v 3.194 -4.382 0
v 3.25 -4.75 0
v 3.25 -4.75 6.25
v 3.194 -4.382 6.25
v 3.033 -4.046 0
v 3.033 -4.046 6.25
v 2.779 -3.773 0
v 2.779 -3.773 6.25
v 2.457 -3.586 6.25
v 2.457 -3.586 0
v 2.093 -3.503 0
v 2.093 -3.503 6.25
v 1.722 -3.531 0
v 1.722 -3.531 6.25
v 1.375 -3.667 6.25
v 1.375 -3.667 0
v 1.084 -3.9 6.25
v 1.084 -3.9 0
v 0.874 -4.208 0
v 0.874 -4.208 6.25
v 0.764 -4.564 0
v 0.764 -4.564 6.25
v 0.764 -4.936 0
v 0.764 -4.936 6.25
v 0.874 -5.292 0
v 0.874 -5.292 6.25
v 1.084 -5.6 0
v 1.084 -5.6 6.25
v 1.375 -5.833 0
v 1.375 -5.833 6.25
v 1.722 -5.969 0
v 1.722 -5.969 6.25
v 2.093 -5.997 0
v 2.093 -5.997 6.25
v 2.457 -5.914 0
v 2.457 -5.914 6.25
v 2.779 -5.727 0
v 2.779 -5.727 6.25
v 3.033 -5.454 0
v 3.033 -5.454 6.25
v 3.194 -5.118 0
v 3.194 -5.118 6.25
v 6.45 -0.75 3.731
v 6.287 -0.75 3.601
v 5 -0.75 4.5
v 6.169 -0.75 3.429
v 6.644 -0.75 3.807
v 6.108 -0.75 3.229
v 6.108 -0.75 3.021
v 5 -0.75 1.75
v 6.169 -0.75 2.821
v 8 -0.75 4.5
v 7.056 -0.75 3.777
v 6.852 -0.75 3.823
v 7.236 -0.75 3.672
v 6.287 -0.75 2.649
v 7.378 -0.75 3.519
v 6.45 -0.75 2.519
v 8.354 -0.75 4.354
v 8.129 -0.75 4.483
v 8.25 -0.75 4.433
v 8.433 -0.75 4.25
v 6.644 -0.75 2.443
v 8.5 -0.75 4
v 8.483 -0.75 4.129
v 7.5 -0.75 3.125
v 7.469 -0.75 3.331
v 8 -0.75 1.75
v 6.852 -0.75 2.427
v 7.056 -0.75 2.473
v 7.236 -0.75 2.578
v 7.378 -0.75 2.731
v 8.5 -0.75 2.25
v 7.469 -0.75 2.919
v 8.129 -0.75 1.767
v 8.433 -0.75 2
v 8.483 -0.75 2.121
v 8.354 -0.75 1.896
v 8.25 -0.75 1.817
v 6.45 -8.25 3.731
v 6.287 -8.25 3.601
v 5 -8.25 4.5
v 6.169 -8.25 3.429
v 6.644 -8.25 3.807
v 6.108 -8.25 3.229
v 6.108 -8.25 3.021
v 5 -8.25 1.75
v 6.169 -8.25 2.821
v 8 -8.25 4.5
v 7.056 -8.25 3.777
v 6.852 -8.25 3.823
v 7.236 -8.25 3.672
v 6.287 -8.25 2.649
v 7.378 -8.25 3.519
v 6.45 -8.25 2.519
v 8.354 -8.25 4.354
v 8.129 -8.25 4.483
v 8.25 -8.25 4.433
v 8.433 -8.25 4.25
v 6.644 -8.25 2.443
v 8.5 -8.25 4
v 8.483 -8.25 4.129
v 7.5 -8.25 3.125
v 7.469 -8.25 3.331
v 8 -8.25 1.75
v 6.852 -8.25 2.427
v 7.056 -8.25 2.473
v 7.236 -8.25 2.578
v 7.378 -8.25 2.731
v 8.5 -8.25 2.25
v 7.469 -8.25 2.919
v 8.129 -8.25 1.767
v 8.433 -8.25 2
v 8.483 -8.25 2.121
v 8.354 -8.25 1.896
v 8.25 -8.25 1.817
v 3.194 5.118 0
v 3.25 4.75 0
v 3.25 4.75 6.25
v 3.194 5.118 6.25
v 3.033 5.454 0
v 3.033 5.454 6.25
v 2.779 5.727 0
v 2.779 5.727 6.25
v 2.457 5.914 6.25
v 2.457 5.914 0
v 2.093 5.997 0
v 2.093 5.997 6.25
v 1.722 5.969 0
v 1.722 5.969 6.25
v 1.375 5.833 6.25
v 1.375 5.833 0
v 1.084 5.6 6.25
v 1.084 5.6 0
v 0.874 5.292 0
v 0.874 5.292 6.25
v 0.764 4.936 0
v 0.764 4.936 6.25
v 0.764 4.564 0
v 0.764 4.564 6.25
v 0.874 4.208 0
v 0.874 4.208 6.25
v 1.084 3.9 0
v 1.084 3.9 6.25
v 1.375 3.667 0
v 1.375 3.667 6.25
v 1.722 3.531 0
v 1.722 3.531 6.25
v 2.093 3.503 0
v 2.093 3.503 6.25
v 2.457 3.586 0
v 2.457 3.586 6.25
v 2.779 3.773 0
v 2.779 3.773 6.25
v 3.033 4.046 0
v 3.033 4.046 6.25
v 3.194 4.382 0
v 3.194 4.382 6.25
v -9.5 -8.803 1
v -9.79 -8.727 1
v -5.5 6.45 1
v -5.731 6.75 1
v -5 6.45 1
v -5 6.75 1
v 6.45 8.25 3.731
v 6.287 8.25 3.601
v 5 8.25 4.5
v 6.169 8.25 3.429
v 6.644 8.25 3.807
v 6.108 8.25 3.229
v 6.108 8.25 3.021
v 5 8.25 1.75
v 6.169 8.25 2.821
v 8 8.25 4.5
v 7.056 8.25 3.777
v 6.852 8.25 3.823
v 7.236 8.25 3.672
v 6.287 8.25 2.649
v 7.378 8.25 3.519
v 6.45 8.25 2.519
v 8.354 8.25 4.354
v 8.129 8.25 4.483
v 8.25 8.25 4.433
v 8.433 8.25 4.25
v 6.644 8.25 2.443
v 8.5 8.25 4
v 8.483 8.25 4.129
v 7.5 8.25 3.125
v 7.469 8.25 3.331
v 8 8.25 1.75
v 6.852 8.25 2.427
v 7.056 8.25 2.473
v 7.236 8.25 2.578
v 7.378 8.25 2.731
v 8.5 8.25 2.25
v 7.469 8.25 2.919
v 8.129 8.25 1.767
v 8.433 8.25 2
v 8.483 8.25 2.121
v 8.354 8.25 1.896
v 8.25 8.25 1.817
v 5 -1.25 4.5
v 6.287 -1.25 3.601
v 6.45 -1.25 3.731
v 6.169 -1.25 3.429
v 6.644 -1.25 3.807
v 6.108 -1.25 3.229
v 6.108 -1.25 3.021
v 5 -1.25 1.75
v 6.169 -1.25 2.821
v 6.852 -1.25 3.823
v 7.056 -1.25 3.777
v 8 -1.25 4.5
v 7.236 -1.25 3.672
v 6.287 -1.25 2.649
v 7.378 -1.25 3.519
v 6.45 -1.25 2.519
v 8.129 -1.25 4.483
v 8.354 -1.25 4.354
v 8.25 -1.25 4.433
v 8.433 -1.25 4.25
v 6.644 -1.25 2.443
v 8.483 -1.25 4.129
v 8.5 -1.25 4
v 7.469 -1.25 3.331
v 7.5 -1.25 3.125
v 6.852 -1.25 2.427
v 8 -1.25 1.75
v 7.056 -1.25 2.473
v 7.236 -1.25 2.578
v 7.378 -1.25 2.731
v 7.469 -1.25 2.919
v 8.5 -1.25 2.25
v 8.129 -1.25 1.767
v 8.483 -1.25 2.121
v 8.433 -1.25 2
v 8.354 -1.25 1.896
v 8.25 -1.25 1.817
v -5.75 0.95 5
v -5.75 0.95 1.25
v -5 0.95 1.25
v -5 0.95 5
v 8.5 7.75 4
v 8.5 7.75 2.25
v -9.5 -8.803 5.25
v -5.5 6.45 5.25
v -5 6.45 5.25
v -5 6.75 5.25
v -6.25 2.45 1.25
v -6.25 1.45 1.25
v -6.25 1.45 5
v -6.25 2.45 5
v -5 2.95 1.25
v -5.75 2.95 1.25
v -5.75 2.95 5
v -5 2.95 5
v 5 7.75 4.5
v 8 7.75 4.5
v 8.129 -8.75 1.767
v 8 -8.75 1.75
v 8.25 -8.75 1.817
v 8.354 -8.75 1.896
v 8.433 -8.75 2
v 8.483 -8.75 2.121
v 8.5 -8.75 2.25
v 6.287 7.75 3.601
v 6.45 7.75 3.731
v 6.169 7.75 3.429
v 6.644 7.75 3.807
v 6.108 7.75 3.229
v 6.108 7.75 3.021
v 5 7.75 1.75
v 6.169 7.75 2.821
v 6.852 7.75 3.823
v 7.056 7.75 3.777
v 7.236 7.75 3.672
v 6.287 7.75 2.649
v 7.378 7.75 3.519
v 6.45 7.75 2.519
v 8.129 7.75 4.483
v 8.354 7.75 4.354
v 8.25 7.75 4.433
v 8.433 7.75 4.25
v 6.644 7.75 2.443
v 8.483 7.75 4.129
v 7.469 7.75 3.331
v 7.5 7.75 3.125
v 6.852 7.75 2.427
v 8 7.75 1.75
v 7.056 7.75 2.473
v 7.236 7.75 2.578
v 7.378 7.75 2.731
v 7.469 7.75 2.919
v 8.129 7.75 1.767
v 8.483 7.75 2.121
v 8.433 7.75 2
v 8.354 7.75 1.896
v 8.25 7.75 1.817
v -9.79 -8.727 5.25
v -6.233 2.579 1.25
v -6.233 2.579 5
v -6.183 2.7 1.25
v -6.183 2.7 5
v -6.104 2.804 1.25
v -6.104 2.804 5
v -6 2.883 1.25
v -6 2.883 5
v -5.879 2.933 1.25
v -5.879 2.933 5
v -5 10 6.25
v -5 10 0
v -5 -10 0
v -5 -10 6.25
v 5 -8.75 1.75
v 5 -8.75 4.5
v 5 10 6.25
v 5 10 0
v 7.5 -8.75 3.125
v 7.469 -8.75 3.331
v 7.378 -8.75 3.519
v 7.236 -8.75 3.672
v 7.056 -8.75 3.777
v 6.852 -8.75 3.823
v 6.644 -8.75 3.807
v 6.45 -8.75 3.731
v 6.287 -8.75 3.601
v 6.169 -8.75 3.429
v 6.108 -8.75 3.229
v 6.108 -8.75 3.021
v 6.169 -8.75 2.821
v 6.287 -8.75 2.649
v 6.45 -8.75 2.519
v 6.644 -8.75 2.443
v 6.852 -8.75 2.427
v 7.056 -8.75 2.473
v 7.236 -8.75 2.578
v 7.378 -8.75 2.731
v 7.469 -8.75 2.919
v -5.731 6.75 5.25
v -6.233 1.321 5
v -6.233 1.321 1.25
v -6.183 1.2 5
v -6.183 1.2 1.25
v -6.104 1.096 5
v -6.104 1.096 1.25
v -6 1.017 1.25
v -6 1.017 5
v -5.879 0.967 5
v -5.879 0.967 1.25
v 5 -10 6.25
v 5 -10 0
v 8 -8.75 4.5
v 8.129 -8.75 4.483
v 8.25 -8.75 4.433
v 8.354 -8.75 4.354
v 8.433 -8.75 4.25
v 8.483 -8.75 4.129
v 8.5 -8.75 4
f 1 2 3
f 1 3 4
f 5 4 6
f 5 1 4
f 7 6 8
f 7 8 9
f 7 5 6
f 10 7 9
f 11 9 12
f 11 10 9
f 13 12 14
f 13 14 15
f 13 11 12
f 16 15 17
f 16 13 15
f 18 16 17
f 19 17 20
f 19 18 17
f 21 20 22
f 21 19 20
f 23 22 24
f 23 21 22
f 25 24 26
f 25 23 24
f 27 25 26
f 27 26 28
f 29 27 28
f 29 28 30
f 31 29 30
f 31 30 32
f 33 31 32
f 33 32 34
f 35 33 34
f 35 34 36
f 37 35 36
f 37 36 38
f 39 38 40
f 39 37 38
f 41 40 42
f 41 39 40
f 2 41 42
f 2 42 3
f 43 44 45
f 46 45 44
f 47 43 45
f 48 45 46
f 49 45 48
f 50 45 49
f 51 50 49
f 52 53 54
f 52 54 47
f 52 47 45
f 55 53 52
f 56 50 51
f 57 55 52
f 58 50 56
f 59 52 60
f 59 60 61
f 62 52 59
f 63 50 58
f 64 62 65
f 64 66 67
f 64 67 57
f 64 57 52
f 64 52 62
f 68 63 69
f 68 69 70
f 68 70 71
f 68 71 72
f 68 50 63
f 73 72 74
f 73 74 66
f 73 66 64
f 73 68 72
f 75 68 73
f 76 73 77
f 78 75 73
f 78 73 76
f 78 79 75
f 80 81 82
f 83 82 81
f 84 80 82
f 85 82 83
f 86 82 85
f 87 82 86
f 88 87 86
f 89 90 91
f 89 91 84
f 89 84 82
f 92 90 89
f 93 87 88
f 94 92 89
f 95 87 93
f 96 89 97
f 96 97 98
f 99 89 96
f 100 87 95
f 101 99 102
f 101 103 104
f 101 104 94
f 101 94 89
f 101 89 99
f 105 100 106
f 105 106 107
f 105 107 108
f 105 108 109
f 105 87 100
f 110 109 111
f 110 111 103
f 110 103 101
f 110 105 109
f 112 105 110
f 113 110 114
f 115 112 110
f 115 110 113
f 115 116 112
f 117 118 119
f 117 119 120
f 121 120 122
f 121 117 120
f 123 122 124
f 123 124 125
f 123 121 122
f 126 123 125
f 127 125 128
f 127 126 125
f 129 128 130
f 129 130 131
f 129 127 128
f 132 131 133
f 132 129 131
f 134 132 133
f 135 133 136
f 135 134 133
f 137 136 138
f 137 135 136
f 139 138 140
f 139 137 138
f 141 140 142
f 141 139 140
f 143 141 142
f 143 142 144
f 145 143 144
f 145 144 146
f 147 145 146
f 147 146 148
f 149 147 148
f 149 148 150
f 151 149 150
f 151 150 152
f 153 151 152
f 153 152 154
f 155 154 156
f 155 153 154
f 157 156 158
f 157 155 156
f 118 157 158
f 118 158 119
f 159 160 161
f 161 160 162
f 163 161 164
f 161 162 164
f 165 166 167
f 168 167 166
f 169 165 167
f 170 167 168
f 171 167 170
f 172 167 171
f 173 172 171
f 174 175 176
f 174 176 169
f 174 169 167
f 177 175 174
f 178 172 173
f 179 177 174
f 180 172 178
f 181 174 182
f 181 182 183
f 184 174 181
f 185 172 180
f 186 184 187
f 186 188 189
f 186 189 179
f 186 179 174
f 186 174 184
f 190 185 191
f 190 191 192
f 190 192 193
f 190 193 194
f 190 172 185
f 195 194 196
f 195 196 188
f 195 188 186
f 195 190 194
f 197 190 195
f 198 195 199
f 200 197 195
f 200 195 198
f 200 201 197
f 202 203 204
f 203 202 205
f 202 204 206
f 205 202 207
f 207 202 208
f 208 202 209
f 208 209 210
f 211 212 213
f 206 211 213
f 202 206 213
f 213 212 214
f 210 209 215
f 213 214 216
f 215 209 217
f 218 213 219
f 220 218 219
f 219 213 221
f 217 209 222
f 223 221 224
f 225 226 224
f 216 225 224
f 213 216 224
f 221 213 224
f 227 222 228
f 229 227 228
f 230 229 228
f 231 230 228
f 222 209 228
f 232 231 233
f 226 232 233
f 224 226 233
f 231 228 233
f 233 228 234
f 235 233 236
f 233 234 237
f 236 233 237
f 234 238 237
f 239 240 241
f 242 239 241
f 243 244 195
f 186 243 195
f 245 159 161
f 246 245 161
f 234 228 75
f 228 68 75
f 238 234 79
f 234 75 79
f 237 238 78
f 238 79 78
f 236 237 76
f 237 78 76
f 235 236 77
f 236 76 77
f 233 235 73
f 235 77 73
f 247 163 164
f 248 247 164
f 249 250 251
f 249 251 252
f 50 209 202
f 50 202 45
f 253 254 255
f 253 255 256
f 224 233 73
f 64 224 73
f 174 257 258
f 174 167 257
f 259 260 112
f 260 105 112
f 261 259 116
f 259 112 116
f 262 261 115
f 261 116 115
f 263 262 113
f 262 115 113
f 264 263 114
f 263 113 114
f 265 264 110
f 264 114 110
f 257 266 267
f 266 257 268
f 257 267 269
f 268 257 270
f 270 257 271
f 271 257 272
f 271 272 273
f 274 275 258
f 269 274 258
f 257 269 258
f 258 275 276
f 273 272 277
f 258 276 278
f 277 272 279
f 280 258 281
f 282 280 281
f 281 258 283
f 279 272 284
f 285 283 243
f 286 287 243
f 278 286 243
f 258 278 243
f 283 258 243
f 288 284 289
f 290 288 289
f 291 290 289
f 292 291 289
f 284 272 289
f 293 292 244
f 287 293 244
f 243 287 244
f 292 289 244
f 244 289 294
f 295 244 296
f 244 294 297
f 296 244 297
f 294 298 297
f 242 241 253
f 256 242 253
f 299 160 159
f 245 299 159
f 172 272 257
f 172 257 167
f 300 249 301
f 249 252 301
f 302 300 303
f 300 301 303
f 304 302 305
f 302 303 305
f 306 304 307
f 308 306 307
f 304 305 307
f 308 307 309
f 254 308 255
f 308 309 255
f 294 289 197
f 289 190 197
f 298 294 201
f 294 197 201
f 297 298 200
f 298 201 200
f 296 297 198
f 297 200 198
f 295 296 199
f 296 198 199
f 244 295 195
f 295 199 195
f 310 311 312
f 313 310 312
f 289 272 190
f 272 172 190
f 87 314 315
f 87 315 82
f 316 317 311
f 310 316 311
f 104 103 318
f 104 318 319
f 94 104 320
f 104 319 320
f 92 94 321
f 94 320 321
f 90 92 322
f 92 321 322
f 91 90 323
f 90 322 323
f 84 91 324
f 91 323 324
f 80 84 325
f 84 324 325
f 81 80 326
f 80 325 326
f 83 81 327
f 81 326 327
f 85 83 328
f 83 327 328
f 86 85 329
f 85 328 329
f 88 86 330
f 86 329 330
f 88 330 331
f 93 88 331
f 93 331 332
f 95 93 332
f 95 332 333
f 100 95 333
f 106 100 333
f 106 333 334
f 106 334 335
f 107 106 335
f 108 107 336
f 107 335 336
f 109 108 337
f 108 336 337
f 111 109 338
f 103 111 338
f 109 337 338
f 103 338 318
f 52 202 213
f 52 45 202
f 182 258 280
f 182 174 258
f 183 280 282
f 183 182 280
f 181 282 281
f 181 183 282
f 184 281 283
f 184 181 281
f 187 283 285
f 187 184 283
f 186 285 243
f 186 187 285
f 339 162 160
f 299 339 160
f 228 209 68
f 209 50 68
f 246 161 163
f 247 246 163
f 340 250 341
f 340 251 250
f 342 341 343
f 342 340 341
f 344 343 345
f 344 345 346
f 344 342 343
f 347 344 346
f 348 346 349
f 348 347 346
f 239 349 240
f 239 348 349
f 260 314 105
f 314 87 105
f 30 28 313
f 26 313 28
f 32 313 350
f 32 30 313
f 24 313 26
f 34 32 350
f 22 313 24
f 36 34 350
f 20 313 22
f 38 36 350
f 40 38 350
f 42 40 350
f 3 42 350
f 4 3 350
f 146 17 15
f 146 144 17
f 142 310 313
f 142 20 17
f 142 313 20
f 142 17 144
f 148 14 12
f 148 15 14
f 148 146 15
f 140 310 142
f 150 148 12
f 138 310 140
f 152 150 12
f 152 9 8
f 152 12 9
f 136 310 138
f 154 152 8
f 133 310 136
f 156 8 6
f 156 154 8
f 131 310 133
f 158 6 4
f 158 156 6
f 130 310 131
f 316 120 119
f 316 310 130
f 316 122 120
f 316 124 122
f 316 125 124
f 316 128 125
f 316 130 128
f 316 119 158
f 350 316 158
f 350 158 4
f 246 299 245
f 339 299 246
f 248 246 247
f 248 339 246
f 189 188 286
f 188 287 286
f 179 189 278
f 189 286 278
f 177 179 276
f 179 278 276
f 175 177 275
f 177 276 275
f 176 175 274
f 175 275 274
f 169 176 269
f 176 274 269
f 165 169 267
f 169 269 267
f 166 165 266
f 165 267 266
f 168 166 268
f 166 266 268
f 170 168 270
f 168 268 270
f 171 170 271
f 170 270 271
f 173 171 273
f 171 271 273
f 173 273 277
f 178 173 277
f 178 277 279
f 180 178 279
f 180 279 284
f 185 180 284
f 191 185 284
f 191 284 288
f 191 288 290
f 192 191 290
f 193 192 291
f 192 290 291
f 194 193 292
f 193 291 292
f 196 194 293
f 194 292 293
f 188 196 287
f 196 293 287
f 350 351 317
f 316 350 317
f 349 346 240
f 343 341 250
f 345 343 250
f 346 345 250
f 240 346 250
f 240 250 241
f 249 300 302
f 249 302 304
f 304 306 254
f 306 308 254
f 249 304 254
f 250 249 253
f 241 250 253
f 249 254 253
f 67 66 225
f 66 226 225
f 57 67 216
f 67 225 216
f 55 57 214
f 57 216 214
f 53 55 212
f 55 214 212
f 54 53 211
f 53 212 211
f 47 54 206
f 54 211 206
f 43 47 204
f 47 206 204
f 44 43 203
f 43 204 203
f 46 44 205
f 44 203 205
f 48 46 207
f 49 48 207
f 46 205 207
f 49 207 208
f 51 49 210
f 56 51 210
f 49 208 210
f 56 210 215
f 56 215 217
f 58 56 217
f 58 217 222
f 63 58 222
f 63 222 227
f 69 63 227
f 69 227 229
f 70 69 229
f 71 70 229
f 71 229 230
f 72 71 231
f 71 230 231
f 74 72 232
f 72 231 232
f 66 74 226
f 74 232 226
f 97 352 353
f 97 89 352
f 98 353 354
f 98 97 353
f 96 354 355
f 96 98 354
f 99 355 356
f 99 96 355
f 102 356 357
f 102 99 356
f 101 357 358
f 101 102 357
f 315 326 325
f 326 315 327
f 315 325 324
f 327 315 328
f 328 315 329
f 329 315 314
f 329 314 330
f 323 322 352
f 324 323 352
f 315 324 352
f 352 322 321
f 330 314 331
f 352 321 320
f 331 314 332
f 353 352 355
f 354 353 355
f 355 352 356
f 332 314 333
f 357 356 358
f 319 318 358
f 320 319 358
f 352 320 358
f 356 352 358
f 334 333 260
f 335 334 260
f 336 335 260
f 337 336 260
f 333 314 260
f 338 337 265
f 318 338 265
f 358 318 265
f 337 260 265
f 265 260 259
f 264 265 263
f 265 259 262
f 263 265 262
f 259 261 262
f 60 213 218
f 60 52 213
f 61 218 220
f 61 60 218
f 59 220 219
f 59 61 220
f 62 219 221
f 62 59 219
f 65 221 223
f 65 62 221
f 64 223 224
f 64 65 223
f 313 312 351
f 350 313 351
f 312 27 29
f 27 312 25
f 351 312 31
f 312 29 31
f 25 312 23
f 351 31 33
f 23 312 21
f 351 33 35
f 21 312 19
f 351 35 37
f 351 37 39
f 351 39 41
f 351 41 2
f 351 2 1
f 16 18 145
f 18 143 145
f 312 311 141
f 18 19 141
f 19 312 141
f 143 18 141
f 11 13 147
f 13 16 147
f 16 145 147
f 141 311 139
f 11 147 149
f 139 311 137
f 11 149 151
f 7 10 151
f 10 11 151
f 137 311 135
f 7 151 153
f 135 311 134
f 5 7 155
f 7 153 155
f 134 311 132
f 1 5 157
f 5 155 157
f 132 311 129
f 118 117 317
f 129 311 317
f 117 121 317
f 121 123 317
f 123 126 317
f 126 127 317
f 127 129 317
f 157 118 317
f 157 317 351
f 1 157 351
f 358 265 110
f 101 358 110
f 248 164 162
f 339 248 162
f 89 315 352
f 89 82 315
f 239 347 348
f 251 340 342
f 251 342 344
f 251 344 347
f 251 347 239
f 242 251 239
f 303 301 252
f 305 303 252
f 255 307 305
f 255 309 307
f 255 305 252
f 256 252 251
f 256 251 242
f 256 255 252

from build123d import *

# Parameters (mm, degrees)
F0_R          = 1.25
F1_DEPTH      = 6.25
F2_START      = 1.75
F0_W          = 3.5
F0_H          = 0.5
F2_DEPTH      = 2.75
F3_START      = 1
F3_DEPTH      = 4.25
F4_START      = 1.25
F0_W_2        = 1.25
F0_H_2        = 2
F4_DEPTH      = 3.75
F5_R          = 0.5
F6_R          = 0.7
F7_DEPTH      = 10.001
F7_DEPTH_BACK = 10.001
F8_R          = 0.5
F8_2_R        = 0.5
F8_3_R        = 0.5


with BuildPart() as f1:
    # F0 (on Top) → F1 (new body)
    with BuildSketch(Plane.XY):
        Polygon((5, 10), (-5, 10), (-5, 6.75), (-5, 6.45), (-5, 2.95), (-5, 0.95), (-5, -10), (5, -10), (5, -8.75), (5, -8.25), (5, -1.25), (5, -0.75), (5, 7.75), (5, 8.25), align=None)
        with Locations((2, -4.75)):
            Circle(F0_R, mode=Mode.SUBTRACT)
        with Locations((2, 4.75)):
            Circle(F0_R, mode=Mode.SUBTRACT)
    extrude(amount=F1_DEPTH)


with BuildPart() as f2:
    # F0 (on Top) → F2 (new body)
    with BuildSketch(Plane.XY.offset(F2_START)):
        with Locations((6.75, -8.5)):
            Rectangle(F0_W, F0_H)
    extrude(amount=F2_DEPTH)


with BuildPart() as f2b:
    # F0 (on Top) → F2, piece 2 (new body)
    with BuildSketch(Plane.XY.offset(F2_START)):
        with Locations((6.75, -1)):
            Rectangle(F0_W, F0_H)
    extrude(amount=F2_DEPTH)


with BuildPart() as f2c:
    # F0 (on Top) → F2, piece 3 (new body)
    with BuildSketch(Plane.XY.offset(F2_START)):
        with Locations((6.75, 8)):
            Rectangle(F0_W, F0_H)
    extrude(amount=F2_DEPTH)


with BuildPart() as f3:
    # F0 (on Top) → F3 (new body)
    with BuildSketch(Plane.XY.offset(F3_START)):
        Polygon((-5, 6.45), (-5, 6.75), (-5.7314702465, 6.75), (-9.7901872608, -8.7266539083), (-9.5, -8.8027548523), (-5.5, 6.45), align=None)
    extrude(amount=F3_DEPTH)


with BuildPart() as f4:
    # F0 (on Top) → F4 (new body)
    with BuildSketch(Plane.XY.offset(F4_START)):
        with Locations((-5.625, 1.95)):
            Rectangle(F0_W_2, F0_H_2)
    extrude(amount=F4_DEPTH)

    # F5
    f5_edges = [f4.edges().sort_by_distance(p)[0] for p in [
        (-6.25, 0.95, 3.125),
        (-6.25, 2.95, 3.125),
    ]]
    fillet(f5_edges, radius=F5_R)


with BuildPart() as f7_tool:
    # F6 (on Front) → F7 (new body, two sides)
    with BuildSketch(Plane.XZ) as f7_sk:
        with Locations((6.8, 3.125)):
            Circle(F6_R)
    extrude(amount=F7_DEPTH)
    extrude(f7_sk.sketch, amount=-F7_DEPTH_BACK)


with BuildPart() as f2_1:
    add(f2.part)

    # F7: cut by f7_tool
    add(f7_tool.part, mode=Mode.SUBTRACT)

    # F8
    f8_edges = [f2_1.edges().sort_by_distance(p)[0] for p in [
        (8.5, -8.5, 4.5),
        (8.5, -8.5, 1.75),
    ]]
    fillet(f8_edges, radius=F8_R)


with BuildPart() as f2b_1:
    add(f2b.part)

    # F7: cut by f7_tool
    add(f7_tool.part, mode=Mode.SUBTRACT)

    # F8#2
    f8_2_edges = [f2b_1.edges().sort_by_distance(p)[0] for p in [
        (8.5, -1, 1.75),
        (8.5, -1, 4.5),
    ]]
    fillet(f8_2_edges, radius=F8_2_R)


with BuildPart() as f2c_1:
    add(f2c.part)

    # F7: cut by f7_tool
    add(f7_tool.part, mode=Mode.SUBTRACT)

    # F8#3
    f8_3_edges = [f2c_1.edges().sort_by_distance(p)[0] for p in [
        (8.5, 8, 4.5),
        (8.5, 8, 1.75),
    ]]
    fillet(f8_3_edges, radius=F8_3_R)


solid = Compound([f1.part, f3.part, f4.part, f2_1.part, f2b_1.part, f2c_1.part])
